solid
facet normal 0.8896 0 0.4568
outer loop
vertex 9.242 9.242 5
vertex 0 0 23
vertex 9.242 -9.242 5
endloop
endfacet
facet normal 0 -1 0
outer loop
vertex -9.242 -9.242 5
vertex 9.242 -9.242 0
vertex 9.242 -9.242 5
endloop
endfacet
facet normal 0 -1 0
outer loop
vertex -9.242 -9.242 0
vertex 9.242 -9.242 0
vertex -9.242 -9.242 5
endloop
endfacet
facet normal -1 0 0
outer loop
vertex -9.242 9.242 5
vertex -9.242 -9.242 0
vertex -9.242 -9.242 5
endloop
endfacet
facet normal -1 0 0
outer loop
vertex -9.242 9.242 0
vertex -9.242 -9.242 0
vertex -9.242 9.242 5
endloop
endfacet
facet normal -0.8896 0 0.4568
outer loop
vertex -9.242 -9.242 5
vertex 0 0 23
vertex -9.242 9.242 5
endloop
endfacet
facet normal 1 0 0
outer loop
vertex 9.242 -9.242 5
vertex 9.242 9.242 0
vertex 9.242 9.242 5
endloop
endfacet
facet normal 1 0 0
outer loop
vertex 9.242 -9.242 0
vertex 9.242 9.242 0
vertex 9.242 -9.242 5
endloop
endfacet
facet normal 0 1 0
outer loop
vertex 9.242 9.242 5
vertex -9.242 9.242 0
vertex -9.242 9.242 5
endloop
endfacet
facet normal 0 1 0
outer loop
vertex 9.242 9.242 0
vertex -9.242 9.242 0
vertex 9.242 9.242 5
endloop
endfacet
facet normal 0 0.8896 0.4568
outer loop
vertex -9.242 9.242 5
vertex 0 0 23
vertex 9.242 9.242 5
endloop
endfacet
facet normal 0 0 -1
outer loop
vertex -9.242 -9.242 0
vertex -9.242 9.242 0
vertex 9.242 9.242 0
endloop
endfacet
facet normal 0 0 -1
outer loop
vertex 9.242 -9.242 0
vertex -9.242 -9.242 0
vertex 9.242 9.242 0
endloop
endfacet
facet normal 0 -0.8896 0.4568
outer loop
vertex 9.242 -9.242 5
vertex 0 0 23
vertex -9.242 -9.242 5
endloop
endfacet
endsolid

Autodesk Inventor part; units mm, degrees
ref_plane "YZ Plane" through (0, 0, 0) normal (1, 0, 0) x (0, 1, 0)
ref_plane "XZ Plane" through (0, 0, 0) normal (0, 1, 0) x (-1, 0, 0)
ref_plane "XY Plane" through (0, 0, 0) normal (0, 0, 1) x (1, 0, 0)
sketch "Absorber-Base" plane through (0, 0, 0) normal (0, 0, 1) x (1, 0, 0)
  line L0 (-9.2424, 9.2424) -> (9.2424, 9.2424)
  line L1 (9.2424, 9.2424) -> (9.2424, -9.2424)
  line L2 (9.2424, -9.2424) -> (-9.2424, -9.2424)
  line L3 (-9.2424, -9.2424) -> (-9.2424, 9.2424)
  line L4 (-9.2424, 9.2424) -> (9.2424, -9.2424) construction
  line L5 (9.2424, 9.2424) -> (-9.2424, -9.2424) construction
  point P0 (0, 0)
  dimension "d0" = 18.4849
extrude "Gesamtvolumen" add sketch "Absorber-Base" along normal blind 23
sketch "Skizze2" plane through (0, 0, 0) normal (0, 1, 0) x (-1, 0, 0)
  line L0 (-28, 0) -> (28, 0) projected
  line L1 (9.2424, 0) -> (9.2424, 23) projected
  line L2 (-9.2424, 0) -> (-9.2424, 23) projected
  line L3 (9.2424, 0) -> (-9.2424, 0)
  line L4 (-9.2424, 0) -> (-9.2424, 5)
  line L5 (-9.2424, 5) -> (9.2424, 5)
  line L6 (9.2424, 5) -> (9.2424, 0)
  line L7 (-9.2424, 23) -> (9.2424, 23) projected
  line L8 (0, 23) -> (9.2424, 5)
  line L9 (0, 23) -> (-9.2424, 5)
  point P0 (0, 0)
  point P1 (9.2424, 5)
  dimension "d6" = 5
extrude "Cutaway" cut sketch "Skizze2" along normal mid plane 18.4848 contours L2 L7 L9 | L8 L7 L1
pattern_circular "Runde Anordnung1" count 2 over 90 about axis through (0, 0, -10) along (0, 0, 1) of "Cutaway"
equation "\"d0\" = Base_Seitenlänge"
equation "\"d1\" = Gesamthöhe"
equation "\"d6\" = Base_Höhe"
equation "\"d7\" = Base_Seitenlänge"
equation "\"Base_Seitenlänge\" = 18.48485"
equation "\"Base_Höhe\" = 5"
equation "\"Gesamthöhe\" = 23"
properties part number "Absorber - SEA-PM3"
